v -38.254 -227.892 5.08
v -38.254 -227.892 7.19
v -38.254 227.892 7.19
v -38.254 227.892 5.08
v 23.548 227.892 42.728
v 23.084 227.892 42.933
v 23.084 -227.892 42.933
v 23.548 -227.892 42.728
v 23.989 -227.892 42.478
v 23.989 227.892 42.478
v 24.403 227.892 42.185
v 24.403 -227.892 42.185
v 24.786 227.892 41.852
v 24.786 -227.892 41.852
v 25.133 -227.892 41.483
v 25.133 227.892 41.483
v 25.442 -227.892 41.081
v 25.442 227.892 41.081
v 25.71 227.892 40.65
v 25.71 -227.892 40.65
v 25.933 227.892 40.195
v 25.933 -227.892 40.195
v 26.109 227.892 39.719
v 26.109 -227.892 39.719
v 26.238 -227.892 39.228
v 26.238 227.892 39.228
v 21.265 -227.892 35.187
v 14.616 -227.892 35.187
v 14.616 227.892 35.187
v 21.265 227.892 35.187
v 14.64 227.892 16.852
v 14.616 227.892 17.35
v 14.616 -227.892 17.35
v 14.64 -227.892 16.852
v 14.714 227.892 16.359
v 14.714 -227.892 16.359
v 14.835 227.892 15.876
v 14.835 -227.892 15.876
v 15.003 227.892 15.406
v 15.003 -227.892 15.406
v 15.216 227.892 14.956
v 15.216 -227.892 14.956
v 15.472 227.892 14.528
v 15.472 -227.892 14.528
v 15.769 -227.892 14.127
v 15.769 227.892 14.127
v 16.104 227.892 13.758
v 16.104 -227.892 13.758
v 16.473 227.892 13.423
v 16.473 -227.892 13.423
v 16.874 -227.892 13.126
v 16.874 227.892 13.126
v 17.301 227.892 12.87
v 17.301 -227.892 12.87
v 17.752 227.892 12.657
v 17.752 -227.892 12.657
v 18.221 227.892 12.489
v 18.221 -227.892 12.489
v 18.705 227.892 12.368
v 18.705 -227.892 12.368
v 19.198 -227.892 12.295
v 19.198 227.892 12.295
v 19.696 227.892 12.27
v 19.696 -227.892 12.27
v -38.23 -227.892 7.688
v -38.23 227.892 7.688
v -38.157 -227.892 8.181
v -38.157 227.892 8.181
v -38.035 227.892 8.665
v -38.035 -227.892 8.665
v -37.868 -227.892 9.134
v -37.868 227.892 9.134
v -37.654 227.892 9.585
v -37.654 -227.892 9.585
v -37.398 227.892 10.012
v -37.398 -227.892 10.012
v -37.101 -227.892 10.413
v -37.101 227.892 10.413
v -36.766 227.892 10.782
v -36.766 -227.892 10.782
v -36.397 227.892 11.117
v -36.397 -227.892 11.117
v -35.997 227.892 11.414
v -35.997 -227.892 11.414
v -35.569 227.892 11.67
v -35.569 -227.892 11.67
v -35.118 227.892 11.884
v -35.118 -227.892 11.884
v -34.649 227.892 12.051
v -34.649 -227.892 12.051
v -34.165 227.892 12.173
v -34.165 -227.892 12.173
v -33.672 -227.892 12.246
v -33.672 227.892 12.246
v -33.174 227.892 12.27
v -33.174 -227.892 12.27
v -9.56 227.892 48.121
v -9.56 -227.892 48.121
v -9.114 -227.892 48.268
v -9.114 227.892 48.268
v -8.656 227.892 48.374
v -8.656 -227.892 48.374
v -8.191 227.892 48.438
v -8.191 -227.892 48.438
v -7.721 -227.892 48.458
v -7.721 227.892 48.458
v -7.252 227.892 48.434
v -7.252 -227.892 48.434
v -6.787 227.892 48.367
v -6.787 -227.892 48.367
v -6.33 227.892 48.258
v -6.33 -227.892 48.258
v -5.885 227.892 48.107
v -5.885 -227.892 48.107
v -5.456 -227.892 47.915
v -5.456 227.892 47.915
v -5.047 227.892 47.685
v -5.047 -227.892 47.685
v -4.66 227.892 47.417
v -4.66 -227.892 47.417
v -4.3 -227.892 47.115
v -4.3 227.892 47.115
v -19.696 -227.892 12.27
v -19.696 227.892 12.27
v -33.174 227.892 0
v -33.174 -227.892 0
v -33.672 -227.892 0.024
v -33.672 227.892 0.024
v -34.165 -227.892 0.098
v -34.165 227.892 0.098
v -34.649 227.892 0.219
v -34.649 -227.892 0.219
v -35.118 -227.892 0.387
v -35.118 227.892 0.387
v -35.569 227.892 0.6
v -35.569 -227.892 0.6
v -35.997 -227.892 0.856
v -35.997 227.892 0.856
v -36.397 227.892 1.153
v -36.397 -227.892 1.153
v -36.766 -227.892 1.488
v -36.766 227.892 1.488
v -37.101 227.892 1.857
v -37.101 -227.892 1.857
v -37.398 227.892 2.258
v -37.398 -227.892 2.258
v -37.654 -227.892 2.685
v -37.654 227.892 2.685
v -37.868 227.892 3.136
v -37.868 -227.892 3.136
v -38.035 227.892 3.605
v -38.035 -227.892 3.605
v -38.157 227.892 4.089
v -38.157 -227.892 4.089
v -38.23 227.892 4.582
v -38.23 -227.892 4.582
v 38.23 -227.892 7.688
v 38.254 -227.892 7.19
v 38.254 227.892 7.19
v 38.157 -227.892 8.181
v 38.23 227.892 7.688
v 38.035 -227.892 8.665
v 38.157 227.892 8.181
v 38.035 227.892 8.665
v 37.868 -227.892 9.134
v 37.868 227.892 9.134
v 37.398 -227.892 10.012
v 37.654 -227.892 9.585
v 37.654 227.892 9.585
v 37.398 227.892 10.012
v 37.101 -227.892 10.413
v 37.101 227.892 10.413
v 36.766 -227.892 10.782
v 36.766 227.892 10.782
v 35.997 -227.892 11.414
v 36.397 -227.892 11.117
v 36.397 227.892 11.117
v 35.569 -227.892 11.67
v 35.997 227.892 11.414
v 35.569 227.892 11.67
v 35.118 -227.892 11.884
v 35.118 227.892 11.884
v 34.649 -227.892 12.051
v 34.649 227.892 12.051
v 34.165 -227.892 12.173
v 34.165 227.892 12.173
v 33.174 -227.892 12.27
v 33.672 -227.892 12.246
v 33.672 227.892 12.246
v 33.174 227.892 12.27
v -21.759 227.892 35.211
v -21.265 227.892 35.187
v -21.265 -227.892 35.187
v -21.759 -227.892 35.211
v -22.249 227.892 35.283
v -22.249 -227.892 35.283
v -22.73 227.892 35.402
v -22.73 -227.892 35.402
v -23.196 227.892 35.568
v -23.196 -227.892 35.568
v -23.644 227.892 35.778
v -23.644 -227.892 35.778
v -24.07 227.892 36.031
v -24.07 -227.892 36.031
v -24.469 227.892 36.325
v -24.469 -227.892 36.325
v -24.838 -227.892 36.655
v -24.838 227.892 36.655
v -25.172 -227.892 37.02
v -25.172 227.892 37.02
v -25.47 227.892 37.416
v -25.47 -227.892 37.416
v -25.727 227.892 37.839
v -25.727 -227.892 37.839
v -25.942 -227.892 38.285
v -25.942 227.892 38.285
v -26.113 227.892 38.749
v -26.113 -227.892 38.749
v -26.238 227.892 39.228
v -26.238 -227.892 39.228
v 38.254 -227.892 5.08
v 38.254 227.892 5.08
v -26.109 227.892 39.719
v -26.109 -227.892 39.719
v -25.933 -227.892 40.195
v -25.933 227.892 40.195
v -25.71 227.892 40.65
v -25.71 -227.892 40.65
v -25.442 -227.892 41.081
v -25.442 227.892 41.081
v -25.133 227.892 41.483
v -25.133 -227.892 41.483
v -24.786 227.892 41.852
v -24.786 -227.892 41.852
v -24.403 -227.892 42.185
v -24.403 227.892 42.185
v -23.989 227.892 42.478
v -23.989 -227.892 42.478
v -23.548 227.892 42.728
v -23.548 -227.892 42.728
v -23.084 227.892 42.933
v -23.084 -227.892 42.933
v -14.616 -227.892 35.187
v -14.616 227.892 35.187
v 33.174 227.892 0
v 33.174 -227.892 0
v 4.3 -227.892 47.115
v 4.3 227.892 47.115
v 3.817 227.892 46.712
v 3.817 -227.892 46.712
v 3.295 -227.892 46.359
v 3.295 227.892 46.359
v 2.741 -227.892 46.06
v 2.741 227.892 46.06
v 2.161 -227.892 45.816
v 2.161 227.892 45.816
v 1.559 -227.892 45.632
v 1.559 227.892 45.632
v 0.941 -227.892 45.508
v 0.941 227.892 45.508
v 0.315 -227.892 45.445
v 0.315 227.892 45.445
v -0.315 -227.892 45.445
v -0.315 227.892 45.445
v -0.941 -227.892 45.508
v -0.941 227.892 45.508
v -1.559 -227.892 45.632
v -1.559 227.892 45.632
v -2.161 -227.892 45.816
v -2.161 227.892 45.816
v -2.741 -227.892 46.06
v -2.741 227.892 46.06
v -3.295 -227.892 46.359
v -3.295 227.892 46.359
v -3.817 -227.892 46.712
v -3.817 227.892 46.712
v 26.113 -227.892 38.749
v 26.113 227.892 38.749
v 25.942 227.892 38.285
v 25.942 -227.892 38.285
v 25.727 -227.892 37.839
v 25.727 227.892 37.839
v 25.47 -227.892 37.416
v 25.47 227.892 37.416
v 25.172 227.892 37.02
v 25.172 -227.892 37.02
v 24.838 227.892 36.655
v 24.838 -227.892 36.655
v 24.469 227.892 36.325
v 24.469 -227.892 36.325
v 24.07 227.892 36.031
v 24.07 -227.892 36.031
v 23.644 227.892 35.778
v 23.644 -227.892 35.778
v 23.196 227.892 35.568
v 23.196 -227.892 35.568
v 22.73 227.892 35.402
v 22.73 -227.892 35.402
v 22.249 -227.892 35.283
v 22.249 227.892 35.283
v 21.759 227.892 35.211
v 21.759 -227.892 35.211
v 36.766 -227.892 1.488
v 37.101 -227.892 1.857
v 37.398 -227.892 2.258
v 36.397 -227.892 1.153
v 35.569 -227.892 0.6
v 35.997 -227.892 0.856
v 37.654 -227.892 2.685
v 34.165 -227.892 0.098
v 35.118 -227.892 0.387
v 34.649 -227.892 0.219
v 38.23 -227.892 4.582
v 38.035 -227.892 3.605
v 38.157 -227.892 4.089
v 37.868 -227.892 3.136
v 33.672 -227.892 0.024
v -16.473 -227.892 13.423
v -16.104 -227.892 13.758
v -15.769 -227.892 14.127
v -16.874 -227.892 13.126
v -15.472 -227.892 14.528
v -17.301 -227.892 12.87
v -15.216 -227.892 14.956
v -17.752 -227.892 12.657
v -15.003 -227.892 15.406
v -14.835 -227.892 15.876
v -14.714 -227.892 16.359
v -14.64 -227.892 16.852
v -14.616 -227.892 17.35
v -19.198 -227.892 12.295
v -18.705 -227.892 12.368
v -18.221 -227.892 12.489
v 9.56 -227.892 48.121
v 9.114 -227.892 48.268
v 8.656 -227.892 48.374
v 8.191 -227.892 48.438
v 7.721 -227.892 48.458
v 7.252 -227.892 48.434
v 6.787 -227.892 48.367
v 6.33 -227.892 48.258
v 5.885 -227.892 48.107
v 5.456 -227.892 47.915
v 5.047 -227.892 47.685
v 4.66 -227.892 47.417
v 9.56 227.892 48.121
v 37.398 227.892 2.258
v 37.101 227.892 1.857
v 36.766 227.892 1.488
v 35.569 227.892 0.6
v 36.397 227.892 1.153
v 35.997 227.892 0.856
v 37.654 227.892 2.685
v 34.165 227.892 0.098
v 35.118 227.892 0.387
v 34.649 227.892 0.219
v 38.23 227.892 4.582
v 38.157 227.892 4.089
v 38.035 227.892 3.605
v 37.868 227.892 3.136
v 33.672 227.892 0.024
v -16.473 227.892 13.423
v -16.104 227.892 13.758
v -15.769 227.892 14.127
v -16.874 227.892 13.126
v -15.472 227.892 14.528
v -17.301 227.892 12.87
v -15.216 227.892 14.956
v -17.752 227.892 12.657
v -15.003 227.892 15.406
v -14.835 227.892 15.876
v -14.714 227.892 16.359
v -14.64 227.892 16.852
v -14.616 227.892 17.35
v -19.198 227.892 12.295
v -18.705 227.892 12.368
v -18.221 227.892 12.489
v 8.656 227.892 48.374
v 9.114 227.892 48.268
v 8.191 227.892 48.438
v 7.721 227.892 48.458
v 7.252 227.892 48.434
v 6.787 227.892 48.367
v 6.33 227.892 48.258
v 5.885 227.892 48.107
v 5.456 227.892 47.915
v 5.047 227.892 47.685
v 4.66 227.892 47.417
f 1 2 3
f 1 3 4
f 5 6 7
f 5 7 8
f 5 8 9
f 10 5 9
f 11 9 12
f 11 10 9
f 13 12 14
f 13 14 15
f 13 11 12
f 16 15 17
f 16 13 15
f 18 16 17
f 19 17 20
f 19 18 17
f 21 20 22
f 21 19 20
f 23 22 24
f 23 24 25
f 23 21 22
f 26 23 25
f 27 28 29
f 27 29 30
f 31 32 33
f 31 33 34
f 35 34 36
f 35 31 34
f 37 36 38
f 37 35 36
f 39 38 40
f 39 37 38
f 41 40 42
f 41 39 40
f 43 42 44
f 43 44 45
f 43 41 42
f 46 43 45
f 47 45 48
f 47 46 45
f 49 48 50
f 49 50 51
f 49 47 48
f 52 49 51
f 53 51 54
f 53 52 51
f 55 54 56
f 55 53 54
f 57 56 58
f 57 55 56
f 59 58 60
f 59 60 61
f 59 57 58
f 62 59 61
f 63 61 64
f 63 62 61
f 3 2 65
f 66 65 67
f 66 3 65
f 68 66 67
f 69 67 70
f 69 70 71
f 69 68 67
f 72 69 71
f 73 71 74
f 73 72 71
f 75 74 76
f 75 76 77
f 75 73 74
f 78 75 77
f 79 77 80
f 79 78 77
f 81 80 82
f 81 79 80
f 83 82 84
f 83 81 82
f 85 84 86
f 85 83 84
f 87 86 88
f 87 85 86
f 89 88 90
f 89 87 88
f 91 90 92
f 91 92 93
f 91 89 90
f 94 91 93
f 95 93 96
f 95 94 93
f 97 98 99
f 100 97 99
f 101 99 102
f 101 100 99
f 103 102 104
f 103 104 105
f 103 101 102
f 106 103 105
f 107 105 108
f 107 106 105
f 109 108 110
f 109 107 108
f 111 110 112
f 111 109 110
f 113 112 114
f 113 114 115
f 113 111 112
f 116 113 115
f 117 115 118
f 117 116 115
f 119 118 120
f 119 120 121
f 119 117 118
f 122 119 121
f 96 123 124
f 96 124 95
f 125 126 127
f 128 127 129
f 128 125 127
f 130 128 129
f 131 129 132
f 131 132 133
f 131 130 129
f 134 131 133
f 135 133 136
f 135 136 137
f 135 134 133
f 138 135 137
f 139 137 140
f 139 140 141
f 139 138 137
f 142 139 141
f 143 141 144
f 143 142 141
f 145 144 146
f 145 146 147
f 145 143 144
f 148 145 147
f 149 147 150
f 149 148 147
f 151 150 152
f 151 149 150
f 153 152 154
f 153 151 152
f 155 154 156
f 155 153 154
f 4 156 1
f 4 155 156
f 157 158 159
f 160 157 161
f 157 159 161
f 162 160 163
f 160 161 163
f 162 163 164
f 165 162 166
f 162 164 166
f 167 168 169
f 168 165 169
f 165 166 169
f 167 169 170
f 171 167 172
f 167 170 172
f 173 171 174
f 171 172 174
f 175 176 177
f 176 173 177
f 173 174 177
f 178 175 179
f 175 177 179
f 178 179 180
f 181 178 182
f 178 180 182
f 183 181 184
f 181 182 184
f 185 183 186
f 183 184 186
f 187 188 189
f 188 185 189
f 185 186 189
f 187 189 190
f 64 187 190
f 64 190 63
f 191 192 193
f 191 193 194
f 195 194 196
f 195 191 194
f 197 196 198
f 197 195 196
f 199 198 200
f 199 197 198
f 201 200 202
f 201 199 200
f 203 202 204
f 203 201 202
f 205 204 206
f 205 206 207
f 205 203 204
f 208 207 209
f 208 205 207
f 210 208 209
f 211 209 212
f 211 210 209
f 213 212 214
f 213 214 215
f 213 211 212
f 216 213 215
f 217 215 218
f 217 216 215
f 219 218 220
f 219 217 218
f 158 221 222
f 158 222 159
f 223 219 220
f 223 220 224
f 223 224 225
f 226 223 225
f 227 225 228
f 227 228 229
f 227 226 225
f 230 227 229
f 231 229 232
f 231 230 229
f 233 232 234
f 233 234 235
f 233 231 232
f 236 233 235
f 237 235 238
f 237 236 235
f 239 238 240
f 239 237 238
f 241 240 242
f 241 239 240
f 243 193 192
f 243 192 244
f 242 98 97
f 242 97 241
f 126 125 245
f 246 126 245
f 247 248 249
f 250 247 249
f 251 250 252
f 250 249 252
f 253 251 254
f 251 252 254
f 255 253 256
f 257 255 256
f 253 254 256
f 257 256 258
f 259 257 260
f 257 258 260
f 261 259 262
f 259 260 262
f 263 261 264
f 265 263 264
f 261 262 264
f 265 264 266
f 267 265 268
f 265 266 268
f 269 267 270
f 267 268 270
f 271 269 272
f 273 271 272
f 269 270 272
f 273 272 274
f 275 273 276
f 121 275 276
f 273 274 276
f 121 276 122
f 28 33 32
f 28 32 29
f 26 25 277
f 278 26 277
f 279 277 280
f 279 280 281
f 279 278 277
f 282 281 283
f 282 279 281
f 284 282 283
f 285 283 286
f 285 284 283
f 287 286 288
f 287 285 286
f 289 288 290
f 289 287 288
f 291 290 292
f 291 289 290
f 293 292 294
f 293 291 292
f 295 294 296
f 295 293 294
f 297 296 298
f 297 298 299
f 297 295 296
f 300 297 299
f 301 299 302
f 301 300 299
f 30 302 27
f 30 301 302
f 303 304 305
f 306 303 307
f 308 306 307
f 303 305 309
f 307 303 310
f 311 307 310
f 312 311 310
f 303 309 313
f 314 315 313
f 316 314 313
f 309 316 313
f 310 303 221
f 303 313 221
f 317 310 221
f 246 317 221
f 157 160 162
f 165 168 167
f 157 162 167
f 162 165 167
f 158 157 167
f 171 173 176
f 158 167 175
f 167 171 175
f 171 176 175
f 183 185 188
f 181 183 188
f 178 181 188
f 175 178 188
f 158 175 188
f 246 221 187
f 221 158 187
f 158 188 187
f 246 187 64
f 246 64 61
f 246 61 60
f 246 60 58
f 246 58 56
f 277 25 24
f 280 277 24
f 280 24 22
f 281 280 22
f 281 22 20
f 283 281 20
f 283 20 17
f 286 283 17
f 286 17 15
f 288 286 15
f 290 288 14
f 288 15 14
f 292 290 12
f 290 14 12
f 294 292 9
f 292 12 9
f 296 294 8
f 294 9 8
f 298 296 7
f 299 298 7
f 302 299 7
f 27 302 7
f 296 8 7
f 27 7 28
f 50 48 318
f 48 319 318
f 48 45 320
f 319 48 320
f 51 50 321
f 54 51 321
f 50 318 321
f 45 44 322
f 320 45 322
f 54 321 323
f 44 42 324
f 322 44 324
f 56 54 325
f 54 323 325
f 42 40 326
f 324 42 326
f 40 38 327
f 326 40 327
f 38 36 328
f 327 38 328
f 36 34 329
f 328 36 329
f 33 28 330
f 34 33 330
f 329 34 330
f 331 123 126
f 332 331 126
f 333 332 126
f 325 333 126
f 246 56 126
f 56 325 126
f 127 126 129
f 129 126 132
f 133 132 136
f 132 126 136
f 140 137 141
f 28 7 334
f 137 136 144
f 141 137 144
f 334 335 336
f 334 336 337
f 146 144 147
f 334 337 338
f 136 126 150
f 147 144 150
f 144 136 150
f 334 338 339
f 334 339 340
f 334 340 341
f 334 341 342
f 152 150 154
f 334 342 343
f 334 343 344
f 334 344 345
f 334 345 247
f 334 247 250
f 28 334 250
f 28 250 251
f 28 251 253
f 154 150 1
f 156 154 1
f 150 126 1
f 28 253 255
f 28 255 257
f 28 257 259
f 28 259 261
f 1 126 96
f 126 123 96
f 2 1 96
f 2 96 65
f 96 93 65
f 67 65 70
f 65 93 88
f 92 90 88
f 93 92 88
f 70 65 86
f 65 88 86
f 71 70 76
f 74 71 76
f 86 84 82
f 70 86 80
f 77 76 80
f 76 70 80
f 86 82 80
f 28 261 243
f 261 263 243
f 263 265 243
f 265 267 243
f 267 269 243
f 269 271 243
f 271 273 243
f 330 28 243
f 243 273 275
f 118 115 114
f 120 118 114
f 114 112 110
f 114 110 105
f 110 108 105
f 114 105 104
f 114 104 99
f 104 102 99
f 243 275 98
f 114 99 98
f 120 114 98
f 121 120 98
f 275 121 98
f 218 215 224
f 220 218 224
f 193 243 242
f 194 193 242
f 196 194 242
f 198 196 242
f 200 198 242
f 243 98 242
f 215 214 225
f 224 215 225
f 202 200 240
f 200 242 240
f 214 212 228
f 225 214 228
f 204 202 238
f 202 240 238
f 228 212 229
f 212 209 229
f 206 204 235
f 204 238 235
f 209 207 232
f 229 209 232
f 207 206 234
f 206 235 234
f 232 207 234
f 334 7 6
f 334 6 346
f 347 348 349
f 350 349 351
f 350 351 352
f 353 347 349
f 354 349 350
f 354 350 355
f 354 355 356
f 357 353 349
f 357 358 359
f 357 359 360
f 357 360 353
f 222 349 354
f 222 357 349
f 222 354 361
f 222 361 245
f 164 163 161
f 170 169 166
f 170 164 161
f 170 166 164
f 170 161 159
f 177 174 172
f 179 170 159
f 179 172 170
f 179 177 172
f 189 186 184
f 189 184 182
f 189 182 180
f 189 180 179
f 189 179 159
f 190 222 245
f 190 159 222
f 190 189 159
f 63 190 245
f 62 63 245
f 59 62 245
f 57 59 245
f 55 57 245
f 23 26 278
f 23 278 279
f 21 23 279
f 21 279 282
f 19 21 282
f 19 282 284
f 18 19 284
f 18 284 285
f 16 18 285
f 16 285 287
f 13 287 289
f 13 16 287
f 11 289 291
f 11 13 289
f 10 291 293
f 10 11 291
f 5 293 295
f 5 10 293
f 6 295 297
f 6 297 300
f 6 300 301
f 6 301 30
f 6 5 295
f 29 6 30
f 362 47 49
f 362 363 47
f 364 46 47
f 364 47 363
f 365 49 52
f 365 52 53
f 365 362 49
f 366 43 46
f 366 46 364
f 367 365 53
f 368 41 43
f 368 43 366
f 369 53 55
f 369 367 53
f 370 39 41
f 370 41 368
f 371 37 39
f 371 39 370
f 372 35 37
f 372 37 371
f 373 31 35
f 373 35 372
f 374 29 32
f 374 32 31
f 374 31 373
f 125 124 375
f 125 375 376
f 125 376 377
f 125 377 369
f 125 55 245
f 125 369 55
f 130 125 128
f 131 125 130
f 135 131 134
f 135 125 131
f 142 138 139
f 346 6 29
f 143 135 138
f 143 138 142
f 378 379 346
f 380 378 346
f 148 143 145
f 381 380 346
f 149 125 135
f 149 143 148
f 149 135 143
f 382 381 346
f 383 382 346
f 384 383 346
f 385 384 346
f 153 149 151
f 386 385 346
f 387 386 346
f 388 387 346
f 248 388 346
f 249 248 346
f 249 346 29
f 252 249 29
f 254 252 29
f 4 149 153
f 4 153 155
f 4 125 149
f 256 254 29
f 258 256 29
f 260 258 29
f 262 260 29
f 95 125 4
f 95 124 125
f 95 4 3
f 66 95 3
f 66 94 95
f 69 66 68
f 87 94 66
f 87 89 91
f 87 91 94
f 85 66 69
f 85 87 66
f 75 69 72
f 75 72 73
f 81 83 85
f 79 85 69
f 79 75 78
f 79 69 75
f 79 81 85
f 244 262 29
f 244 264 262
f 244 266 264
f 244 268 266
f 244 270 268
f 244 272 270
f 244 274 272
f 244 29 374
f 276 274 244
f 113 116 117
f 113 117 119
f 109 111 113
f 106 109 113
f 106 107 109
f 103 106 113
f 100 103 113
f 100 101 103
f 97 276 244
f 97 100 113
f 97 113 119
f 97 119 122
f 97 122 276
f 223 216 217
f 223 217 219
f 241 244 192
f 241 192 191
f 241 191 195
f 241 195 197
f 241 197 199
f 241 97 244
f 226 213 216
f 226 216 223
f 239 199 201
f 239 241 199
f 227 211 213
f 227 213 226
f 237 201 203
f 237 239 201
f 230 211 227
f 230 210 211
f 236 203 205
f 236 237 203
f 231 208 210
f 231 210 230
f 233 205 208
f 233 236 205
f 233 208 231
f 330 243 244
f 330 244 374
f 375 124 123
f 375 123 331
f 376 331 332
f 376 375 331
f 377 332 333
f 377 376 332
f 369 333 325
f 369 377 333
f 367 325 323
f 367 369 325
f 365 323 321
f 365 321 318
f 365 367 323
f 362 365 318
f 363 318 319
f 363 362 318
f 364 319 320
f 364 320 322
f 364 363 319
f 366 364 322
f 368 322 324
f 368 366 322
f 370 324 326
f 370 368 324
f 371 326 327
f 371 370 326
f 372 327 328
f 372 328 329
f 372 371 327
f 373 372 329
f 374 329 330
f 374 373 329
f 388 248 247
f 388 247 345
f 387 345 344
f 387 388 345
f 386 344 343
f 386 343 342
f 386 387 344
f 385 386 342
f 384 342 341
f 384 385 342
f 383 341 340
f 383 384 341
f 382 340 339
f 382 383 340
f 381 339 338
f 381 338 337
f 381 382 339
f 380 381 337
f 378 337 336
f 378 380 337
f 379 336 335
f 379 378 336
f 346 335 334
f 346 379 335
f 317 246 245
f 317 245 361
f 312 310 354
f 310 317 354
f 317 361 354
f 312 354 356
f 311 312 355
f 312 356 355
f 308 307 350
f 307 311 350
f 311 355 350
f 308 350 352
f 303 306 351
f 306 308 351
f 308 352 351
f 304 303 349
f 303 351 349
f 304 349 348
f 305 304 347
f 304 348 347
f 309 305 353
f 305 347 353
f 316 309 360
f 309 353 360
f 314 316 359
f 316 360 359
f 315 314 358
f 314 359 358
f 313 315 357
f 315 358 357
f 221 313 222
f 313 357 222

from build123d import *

# Parameters (mm, degrees)
F1_DEPTH    = 227.8918027878
F3_D        = 12.7
F4_T1_DEPTH = 455.7836055756
F4_T3_DEPTH = 473.2454690546
F4_T5_DEPTH = 481.1836055756
F4_T7_DEPTH = 475.2289422773


# Not quite as in the source:
# - a fillet or chamfer that OpenCascade refuses, or shapes differently, is made with other operations: its cross-section is extruded or revolved along the edge and cut away or added


with BuildPart() as f1:
    # F0 (on Front) → F1 (new body, symmetric)
    with BuildSketch(Plane.XZ):
        Polygon((-38.2542312145, 0), (0, 0), (38.2542312145, 0), (38.2542312145, 12.2701972723), (14.6159976721, 12.2701972723), (14.6159976721, 35.1866483688), (26.3448953629, 35.1866483688), (26.3448953629, 41.6826456785), (0, 51.7875403166), (-26.3448953629, 41.6826456785), (-26.3448953629, 35.1866483688), (-14.6159976721, 35.1866483688), (-14.6159976721, 12.2701972723), (-38.2542312145, 12.2701972723), align=None)
    extrude(amount=F1_DEPTH, both=True)

    # F3 (through all)
    with Locations(Plane.XZ.offset(227.8918027878)):
        with Locations((0, 51.7875403166)):
            Hole(F3_D / 2)

    # F4: fillet of radius 5.08 on 12 edges, made by hand

    # F4_s2 → F4_t1 (join)
    with BuildSketch(Plane.XZ.offset(-227.8918027878)):
        with BuildLine():
            ThreePointArc((-19.6959976721, 12.2701972723), (-16.1038952237, 13.7580948239), (-14.6159976721, 17.3501972723))
            Line((-14.6159976721, 17.3501972723), (-14.6159976721, 12.2701972723))
            Line((-14.6159976721, 12.2701972723), (-19.6959976721, 12.2701972723))
        make_face()
        with BuildLine():
            ThreePointArc((14.6159976721, 17.3501972723), (16.1038952237, 13.7580948239), (19.6959976721, 12.2701972723))
            Line((19.6959976721, 12.2701972723), (14.6159976721, 12.2701972723))
            Line((14.6159976721, 12.2701972723), (14.6159976721, 17.3501972723))
        make_face()
    extrude(amount=F4_T1_DEPTH)

    # F4_s4 → F4_t3 (cut)
    with BuildSketch(Plane.XZ.offset(-236.6227345273)):
        with BuildLine():
            ThreePointArc((23.0841549326, 42.9333410423), (25.4510773115, 41.0681681672), (26.3448953629, 38.1902729827))
            Line((26.3448953629, 38.1902729827), (26.3448953629, 41.6826456785))
            Line((26.3448953629, 41.6826456785), (23.0841549326, 42.9333410423))
        make_face()
        with BuildLine():
            ThreePointArc((-26.3448953629, 38.1902729827), (-25.4510773115, 41.0681681672), (-23.0841549326, 42.9333410423))
            Line((-23.0841549326, 42.9333410423), (-26.3448953629, 41.6826456785))
            Line((-26.3448953629, 41.6826456785), (-26.3448953629, 38.1902729827))
        make_face()
    extrude(amount=F4_T3_DEPTH, mode=Mode.SUBTRACT)

    # F4_s6 → F4_t5 (cut)
    with BuildSketch(Plane.XZ.offset(-240.5918027878)):
        with BuildLine():
            ThreePointArc((26.3448953629, 40.2666483688), (24.8569978113, 36.6745459204), (21.2648953629, 35.1866483688))
            Line((21.2648953629, 35.1866483688), (26.3448953629, 35.1866483688))
            Line((26.3448953629, 35.1866483688), (26.3448953629, 40.2666483688))
        make_face()
        with BuildLine():
            ThreePointArc((-21.2648953629, 35.1866483688), (-24.8569978113, 36.6745459204), (-26.3448953629, 40.2666483688))
            Line((-26.3448953629, 40.2666483688), (-26.3448953629, 35.1866483688))
            Line((-26.3448953629, 35.1866483688), (-21.2648953629, 35.1866483688))
        make_face()
        with BuildLine():
            ThreePointArc((38.2542312145, 7.1901972723), (36.766333663, 10.7822997207), (33.1742312145, 12.2701972723))
            Line((33.1742312145, 12.2701972723), (38.2542312145, 12.2701972723))
            Line((38.2542312145, 12.2701972723), (38.2542312145, 7.1901972723))
        make_face()
        with BuildLine():
            ThreePointArc((33.1742312145, 0), (36.766333663, 1.4878975516), (38.2542312145, 5.08))
            Line((38.2542312145, 5.08), (38.2542312145, 0))
            Line((38.2542312145, 0), (33.1742312145, 0))
        make_face()
        with BuildLine():
            ThreePointArc((-38.2542312145, 7.1901972723), (-36.766333663, 10.7822997207), (-33.1742312145, 12.2701972723))
            Line((-33.1742312145, 12.2701972723), (-38.2542312145, 12.2701972723))
            Line((-38.2542312145, 12.2701972723), (-38.2542312145, 7.1901972723))
        make_face()
        with BuildLine():
            ThreePointArc((-33.1742312145, 0), (-36.766333663, 1.4878975516), (-38.2542312145, 5.08))
            Line((-38.2542312145, 5.08), (-38.2542312145, 0))
            Line((-38.2542312145, 0), (-33.1742312145, 0))
        make_face()
    extrude(amount=F4_T5_DEPTH, mode=Mode.SUBTRACT)

    # F4_s8 → F4_t7 (cut)
    with BuildSketch(Plane.XZ.offset(-237.6144711386)):
        with BuildLine():
            ThreePointArc((-9.5599593035, 48.120705426), (-6.7869567139, 48.367304114), (-4.300388741, 47.1153720109))
            ThreePointArc((-4.300388741, 47.1153720109), (-5.2532816874, 48.2202540213), (-5.9288350745, 49.5134658544))
            Line((-5.9288350745, 49.5134658544), (-9.5599593035, 48.120705426))
        make_face()
        with BuildLine():
            ThreePointArc((4.300388741, 47.1153720109), (6.7869567139, 48.367304114), (9.5599593035, 48.120705426))
            Line((9.5599593035, 48.120705426), (5.9288350745, 49.5134658544))
            ThreePointArc((5.9288350745, 49.5134658544), (5.2532816874, 48.2202540213), (4.300388741, 47.1153720109))
        make_face()
    extrude(amount=F4_T7_DEPTH, mode=Mode.SUBTRACT)


solid = f1.part
